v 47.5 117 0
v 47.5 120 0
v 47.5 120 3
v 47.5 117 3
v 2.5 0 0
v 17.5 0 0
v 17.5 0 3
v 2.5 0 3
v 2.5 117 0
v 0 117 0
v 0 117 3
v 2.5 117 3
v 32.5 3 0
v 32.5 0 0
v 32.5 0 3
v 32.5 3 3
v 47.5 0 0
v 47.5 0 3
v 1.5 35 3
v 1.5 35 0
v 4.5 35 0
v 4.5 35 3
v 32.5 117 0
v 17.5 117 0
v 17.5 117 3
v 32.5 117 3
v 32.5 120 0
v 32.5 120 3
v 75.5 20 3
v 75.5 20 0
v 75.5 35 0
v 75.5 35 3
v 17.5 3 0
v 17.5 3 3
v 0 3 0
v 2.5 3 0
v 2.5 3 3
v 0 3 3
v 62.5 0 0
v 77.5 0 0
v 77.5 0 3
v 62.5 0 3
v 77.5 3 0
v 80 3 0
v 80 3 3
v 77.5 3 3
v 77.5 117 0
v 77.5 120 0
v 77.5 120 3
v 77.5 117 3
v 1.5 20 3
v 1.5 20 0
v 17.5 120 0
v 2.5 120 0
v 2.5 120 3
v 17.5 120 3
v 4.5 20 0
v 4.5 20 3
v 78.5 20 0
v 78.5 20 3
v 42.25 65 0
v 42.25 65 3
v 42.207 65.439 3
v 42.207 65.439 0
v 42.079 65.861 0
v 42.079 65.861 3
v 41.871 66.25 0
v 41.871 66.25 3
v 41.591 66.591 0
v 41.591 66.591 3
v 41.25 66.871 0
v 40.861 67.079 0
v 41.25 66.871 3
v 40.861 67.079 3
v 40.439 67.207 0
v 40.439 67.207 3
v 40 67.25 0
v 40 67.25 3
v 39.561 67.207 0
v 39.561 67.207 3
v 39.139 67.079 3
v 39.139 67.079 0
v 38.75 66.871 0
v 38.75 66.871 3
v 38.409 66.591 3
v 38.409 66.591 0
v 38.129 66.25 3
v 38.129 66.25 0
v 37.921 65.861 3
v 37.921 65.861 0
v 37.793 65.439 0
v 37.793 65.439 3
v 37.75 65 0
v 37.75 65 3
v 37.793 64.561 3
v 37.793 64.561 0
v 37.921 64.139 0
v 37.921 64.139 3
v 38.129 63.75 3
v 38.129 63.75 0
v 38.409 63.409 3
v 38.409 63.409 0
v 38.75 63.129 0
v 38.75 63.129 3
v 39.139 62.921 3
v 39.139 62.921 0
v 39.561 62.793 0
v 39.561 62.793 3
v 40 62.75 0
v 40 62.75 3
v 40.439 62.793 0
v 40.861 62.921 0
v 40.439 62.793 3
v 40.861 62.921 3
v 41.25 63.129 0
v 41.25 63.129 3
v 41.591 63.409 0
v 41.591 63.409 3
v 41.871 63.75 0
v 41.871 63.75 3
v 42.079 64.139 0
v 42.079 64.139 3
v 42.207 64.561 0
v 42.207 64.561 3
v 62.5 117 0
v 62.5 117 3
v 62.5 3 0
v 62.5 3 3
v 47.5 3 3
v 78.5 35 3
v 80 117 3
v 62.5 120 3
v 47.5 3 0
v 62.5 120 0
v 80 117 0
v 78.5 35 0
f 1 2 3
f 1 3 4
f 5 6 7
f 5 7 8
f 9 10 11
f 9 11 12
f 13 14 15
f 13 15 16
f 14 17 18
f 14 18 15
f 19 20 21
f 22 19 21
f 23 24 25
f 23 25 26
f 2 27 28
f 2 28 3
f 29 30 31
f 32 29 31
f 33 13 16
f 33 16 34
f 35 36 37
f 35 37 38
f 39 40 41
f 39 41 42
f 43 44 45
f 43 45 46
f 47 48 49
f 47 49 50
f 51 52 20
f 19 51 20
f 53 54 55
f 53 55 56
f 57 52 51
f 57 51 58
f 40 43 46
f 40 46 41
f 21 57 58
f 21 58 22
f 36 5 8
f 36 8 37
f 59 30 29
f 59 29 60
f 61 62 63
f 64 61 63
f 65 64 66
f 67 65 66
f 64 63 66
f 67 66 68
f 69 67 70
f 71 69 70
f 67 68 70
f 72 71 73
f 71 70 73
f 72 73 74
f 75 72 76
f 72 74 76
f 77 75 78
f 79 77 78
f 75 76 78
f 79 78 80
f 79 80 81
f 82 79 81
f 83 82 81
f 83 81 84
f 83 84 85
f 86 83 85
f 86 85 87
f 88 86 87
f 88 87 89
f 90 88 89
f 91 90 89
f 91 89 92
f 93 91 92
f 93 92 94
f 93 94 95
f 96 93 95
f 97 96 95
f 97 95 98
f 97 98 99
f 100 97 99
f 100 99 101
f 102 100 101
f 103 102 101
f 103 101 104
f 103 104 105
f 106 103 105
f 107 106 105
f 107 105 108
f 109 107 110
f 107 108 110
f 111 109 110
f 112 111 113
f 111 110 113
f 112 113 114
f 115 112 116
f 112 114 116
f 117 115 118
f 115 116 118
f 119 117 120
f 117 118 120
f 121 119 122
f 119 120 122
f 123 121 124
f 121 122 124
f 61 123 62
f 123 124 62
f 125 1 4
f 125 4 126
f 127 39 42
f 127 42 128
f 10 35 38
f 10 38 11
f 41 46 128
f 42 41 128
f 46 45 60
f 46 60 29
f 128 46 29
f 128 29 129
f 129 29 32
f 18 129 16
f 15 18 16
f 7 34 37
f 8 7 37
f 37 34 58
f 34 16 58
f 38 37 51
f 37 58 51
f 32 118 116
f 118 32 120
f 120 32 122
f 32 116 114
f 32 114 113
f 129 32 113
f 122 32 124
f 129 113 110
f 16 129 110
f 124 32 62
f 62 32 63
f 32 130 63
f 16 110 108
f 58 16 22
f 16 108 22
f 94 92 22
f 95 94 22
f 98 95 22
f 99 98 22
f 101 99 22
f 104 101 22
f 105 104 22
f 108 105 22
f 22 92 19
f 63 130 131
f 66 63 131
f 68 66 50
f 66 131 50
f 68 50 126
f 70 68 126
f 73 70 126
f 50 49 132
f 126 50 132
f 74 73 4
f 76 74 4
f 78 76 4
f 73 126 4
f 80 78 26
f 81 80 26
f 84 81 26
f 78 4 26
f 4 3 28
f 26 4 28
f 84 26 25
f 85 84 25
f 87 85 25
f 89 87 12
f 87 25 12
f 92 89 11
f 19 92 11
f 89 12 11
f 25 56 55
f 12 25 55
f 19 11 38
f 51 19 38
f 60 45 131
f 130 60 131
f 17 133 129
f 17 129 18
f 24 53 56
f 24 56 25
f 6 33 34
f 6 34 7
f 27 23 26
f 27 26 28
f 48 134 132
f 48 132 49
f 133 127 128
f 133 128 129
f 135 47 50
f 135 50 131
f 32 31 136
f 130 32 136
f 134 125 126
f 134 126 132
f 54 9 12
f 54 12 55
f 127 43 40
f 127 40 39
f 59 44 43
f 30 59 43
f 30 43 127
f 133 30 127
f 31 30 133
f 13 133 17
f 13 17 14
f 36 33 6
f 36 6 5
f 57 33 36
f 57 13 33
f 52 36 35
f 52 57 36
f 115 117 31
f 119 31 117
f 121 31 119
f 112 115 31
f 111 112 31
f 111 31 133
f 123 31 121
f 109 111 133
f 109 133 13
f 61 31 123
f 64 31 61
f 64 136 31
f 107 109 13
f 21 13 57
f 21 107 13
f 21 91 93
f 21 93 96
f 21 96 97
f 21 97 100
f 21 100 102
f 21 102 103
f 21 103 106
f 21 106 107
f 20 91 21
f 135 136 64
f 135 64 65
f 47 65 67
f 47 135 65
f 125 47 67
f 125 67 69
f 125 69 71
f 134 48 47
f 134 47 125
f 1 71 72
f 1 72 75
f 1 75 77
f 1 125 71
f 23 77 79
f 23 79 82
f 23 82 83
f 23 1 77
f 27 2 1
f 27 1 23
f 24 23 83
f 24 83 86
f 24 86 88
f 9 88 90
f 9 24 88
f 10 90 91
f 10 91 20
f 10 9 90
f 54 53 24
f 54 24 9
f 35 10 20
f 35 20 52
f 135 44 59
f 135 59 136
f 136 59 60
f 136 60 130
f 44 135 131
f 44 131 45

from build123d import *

# Parameters (mm, degrees)
SKETCH_1_W          = 3
SKETCH_1_H          = 15
EXTRUDE_1_DEPTH     = 3
SKETCH_2_R          = 2.25
CUT_EXTRUDE_1_DEPTH = 10


with BuildPart() as part:
    # 草图1 → 凸台-拉伸1 (new body)
    with BuildSketch(Plane.XY):
        Polygon((2.5, 3), (0, 3), (0, 117), (2.5, 117), (2.5, 120), (17.5, 120), (17.5, 117), (32.5, 117), (32.5, 120), (47.5, 120), (47.5, 117), (62.5, 117), (62.5, 120), (77.5, 120), (77.5, 117), (80, 117), (80, 3), (77.5, 3), (77.5, 0), (62.5, 0), (62.5, 3), (47.5, 3), (47.5, 0), (32.5, 0), (32.5, 3), (17.5, 3), (17.5, 0), (2.5, 0), align=None)
        with Locations((77, 27.5)):
            Rectangle(SKETCH_1_W, SKETCH_1_H, mode=Mode.SUBTRACT)
        with Locations((3, 27.5)):
            Rectangle(SKETCH_1_W, SKETCH_1_H, mode=Mode.SUBTRACT)
    extrude(amount=EXTRUDE_1_DEPTH)

    # 草图2 → 切除-拉伸1 (cut)
    with BuildSketch(Plane.XY.offset(3)):
        with Locations((40, 65)):
            Circle(SKETCH_2_R)
    extrude(amount=-CUT_EXTRUDE_1_DEPTH, mode=Mode.SUBTRACT)


solid = part.part
